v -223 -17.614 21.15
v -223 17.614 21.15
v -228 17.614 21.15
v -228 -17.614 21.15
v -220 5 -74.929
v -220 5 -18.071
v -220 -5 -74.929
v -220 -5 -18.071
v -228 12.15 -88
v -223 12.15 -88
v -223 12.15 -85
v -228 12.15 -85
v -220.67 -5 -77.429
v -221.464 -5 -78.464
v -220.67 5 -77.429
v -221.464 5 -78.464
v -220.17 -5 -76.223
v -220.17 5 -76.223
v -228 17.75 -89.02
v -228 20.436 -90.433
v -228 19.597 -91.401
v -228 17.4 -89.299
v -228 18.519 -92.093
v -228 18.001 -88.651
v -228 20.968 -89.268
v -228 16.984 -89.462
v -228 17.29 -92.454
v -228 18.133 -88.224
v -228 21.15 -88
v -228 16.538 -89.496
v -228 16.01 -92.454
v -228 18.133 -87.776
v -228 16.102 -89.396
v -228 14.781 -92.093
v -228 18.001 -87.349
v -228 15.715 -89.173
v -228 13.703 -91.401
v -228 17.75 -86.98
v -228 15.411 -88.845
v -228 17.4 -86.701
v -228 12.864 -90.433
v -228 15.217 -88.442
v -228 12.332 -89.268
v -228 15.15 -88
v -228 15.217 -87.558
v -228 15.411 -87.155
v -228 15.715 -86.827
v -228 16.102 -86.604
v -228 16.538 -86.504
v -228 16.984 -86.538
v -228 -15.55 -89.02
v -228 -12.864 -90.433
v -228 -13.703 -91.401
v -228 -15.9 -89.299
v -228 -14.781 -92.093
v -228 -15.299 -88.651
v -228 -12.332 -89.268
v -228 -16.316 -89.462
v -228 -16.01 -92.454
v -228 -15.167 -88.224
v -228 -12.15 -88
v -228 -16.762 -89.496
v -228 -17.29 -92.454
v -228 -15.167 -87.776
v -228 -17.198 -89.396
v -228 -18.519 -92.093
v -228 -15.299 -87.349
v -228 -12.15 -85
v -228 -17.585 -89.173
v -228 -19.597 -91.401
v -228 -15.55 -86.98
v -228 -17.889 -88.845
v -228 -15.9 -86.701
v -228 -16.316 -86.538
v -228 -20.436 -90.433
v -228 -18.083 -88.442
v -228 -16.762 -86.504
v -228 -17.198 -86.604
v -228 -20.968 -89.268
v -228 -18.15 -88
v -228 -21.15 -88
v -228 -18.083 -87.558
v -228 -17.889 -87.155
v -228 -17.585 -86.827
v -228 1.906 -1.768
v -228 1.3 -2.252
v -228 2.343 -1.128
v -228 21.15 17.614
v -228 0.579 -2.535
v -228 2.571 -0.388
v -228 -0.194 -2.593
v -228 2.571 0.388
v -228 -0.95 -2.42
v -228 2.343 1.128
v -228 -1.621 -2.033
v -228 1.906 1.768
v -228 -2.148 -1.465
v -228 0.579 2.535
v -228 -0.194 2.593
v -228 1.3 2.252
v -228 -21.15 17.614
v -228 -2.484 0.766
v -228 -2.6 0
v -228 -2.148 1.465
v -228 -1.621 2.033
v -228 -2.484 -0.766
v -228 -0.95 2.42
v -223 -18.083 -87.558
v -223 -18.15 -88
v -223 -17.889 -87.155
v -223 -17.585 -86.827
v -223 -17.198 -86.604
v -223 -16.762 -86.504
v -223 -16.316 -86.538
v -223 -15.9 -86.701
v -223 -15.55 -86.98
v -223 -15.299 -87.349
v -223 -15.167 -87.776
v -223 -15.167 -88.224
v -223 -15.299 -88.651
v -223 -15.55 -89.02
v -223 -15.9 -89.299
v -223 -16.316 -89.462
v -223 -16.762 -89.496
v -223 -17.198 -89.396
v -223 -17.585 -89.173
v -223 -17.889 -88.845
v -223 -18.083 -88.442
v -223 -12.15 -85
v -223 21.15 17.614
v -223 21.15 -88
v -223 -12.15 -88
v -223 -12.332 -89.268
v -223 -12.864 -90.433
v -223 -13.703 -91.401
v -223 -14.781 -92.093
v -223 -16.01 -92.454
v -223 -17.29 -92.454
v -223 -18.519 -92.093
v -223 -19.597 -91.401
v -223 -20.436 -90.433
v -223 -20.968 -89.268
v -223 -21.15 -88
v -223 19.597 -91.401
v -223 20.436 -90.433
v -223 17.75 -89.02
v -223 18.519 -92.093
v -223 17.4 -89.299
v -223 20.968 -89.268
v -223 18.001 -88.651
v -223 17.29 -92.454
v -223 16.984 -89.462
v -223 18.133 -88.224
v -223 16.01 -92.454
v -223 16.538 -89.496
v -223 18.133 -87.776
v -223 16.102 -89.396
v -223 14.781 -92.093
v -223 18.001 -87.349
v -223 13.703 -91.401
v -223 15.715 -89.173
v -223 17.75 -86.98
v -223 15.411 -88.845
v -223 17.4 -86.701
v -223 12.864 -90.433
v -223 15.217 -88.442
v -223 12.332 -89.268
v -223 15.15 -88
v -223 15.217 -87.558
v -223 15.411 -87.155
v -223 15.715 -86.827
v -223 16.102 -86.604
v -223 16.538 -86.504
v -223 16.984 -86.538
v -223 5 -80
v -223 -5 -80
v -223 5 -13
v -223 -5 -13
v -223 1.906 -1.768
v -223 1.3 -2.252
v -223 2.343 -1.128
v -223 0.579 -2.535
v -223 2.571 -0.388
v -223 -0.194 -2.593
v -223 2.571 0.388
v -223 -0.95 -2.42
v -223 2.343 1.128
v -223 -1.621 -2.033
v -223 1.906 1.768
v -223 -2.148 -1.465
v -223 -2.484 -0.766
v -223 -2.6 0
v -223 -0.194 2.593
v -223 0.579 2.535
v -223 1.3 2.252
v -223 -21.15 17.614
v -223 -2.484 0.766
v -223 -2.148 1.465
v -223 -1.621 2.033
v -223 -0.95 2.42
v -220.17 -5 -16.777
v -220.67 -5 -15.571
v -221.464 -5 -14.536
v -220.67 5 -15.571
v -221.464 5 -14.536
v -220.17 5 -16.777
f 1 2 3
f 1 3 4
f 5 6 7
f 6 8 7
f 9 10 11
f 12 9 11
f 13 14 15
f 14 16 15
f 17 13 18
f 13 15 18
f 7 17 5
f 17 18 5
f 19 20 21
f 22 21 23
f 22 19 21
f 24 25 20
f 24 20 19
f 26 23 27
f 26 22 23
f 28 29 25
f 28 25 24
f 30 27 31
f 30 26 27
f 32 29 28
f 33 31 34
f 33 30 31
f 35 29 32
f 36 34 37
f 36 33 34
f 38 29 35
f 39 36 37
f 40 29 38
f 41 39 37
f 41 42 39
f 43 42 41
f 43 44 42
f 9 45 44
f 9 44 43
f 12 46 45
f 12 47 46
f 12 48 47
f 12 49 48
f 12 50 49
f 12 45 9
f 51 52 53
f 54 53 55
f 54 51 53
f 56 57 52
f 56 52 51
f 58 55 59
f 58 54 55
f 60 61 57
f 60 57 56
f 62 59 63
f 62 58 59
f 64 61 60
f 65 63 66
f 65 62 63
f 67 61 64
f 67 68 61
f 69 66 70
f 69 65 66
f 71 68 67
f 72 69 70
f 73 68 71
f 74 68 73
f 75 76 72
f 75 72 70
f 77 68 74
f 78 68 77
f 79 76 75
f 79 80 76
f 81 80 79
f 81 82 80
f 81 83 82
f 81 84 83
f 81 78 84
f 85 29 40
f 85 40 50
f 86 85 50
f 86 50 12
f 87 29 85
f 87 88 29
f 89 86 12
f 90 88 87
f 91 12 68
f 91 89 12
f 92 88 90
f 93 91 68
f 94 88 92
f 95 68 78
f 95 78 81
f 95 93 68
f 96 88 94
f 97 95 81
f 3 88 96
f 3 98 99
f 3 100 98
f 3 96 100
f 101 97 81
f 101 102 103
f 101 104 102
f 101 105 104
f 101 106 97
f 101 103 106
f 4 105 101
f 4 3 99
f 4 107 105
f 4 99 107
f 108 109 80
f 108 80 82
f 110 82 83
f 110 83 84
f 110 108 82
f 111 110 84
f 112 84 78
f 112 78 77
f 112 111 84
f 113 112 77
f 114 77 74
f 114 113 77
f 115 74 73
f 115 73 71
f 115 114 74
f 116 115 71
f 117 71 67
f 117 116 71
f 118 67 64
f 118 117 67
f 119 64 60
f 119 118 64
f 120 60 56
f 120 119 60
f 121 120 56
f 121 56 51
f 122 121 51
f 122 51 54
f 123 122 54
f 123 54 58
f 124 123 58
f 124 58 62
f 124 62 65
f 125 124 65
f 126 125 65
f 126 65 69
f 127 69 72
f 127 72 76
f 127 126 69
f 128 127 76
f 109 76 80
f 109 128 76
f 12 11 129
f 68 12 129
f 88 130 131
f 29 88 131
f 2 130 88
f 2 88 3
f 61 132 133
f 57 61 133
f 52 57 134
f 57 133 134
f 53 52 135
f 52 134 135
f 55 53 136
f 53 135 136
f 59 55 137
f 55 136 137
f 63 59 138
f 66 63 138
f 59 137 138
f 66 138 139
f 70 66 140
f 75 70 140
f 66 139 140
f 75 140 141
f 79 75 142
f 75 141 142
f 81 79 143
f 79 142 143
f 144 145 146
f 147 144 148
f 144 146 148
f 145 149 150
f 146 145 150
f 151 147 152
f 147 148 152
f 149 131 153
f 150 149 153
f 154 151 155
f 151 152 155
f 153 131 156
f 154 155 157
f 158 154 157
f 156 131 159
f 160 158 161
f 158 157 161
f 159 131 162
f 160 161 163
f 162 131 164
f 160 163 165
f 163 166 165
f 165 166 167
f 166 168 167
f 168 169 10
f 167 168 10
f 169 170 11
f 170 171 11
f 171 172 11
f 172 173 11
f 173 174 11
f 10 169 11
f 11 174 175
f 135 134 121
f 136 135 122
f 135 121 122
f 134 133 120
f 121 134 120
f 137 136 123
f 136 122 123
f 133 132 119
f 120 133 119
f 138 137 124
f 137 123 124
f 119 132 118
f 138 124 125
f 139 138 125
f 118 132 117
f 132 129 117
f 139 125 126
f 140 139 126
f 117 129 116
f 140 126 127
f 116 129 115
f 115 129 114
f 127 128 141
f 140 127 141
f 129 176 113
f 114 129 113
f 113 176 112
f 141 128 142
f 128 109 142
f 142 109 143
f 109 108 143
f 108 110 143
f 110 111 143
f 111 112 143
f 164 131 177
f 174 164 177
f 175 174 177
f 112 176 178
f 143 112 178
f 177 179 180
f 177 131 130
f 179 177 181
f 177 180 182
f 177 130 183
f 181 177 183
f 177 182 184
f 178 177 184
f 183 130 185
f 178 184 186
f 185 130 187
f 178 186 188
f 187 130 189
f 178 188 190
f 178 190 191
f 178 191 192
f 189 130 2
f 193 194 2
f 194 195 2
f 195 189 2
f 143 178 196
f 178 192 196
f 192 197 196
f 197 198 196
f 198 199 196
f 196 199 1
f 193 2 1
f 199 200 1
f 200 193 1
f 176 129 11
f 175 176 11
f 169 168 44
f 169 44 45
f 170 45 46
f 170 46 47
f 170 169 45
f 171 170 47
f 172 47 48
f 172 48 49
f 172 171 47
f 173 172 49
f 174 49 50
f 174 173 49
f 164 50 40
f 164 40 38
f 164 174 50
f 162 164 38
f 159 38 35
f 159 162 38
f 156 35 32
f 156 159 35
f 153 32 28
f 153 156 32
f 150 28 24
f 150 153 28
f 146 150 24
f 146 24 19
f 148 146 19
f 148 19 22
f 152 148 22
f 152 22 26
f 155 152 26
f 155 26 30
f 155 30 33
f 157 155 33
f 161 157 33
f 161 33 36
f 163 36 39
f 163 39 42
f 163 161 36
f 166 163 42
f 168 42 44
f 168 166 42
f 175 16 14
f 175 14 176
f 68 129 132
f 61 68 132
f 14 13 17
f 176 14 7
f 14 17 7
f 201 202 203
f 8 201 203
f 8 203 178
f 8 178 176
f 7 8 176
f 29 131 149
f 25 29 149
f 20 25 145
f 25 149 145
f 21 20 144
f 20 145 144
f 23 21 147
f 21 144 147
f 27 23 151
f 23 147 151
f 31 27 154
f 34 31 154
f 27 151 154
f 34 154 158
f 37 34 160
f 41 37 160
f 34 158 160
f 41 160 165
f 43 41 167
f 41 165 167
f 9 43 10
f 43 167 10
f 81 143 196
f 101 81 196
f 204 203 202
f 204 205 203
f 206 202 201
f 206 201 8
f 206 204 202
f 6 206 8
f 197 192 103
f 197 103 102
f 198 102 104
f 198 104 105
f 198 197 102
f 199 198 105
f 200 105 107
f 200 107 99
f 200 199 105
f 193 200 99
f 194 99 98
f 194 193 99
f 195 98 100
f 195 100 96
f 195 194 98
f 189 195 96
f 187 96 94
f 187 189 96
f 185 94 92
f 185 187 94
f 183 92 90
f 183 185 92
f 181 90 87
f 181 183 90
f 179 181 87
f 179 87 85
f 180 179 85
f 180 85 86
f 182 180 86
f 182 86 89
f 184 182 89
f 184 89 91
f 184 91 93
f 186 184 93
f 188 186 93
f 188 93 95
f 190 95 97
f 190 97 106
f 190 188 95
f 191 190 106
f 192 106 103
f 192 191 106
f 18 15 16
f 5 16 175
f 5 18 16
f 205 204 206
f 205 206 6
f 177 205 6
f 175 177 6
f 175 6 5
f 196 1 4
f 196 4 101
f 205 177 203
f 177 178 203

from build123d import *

# Parameters (mm, degrees)
SKETCH015_R   = 1.5
SKETCH015_R_2 = 2.6
PAD026_DEPTH  = 5
PAD033_DEPTH  = 5
FILLET004_R   = 5


with BuildPart() as part:
    # Sketch015 (on Face1 of Binder015) → Pad026 (new body)
    with BuildSketch(Plane(origin=(-223, 0, 0), x_dir=(0, -1, 0), z_dir=(-1, 0, 0))):
        with BuildLine():
            Line((-21.15, -85), (-21.15, -88))
            ThreePointArc((-21.15, -88), (-16.65, -92.5), (-12.15, -88))
            Line((-12.15, -88), (-12.15, -85))
            Line((-12.15, -85), (12.15, -85))
            Line((12.15, -85), (12.15, -88))
            ThreePointArc((12.15, -88), (16.65, -92.5), (21.15, -88))
            Line((21.15, -88), (21.15, -85))
            Line((21.15, -85), (21.15, 17.6144660941))
            Line((17.6144660941, 21.15), (21.15, 17.6144660941))
            Line((-17.6144660941, 21.15), (17.6144660941, 21.15))
            Line((-21.15, 17.6144660941), (-17.6144660941, 21.15))
            Line((-21.15, 17.6144660941), (-21.15, -85))
        make_face()
        with Locations((16.65, -88)):
            Circle(SKETCH015_R, mode=Mode.SUBTRACT)
        with Locations((-16.65, -88)):
            Circle(SKETCH015_R, mode=Mode.SUBTRACT)
        Circle(SKETCH015_R_2, mode=Mode.SUBTRACT)
    extrude(amount=PAD026_DEPTH)

    # Sketch083 (on DatumPlane) → Pad033 (join, symmetric)
    with BuildSketch(Plane(origin=(-224.6666666667, 0, -49.6166666667), x_dir=(1, 0, 0), z_dir=(0, -1, 0))):
        Polygon((1.6666666667, 36.6166666667), (4.6666666667, 33.6166666667), (4.6666666667, -27.3833333333), (1.6666666667, -30.3833333333), align=None)
    extrude(amount=PAD033_DEPTH, both=True)

    # Fillet004
    fillet004_edges = [part.edges().sort_by_distance(p)[0] for p in [
        (-220, 0, -16),
        (-220, 0, -77),
    ]]
    fillet(fillet004_edges, radius=FILLET004_R)


solid = part.part
